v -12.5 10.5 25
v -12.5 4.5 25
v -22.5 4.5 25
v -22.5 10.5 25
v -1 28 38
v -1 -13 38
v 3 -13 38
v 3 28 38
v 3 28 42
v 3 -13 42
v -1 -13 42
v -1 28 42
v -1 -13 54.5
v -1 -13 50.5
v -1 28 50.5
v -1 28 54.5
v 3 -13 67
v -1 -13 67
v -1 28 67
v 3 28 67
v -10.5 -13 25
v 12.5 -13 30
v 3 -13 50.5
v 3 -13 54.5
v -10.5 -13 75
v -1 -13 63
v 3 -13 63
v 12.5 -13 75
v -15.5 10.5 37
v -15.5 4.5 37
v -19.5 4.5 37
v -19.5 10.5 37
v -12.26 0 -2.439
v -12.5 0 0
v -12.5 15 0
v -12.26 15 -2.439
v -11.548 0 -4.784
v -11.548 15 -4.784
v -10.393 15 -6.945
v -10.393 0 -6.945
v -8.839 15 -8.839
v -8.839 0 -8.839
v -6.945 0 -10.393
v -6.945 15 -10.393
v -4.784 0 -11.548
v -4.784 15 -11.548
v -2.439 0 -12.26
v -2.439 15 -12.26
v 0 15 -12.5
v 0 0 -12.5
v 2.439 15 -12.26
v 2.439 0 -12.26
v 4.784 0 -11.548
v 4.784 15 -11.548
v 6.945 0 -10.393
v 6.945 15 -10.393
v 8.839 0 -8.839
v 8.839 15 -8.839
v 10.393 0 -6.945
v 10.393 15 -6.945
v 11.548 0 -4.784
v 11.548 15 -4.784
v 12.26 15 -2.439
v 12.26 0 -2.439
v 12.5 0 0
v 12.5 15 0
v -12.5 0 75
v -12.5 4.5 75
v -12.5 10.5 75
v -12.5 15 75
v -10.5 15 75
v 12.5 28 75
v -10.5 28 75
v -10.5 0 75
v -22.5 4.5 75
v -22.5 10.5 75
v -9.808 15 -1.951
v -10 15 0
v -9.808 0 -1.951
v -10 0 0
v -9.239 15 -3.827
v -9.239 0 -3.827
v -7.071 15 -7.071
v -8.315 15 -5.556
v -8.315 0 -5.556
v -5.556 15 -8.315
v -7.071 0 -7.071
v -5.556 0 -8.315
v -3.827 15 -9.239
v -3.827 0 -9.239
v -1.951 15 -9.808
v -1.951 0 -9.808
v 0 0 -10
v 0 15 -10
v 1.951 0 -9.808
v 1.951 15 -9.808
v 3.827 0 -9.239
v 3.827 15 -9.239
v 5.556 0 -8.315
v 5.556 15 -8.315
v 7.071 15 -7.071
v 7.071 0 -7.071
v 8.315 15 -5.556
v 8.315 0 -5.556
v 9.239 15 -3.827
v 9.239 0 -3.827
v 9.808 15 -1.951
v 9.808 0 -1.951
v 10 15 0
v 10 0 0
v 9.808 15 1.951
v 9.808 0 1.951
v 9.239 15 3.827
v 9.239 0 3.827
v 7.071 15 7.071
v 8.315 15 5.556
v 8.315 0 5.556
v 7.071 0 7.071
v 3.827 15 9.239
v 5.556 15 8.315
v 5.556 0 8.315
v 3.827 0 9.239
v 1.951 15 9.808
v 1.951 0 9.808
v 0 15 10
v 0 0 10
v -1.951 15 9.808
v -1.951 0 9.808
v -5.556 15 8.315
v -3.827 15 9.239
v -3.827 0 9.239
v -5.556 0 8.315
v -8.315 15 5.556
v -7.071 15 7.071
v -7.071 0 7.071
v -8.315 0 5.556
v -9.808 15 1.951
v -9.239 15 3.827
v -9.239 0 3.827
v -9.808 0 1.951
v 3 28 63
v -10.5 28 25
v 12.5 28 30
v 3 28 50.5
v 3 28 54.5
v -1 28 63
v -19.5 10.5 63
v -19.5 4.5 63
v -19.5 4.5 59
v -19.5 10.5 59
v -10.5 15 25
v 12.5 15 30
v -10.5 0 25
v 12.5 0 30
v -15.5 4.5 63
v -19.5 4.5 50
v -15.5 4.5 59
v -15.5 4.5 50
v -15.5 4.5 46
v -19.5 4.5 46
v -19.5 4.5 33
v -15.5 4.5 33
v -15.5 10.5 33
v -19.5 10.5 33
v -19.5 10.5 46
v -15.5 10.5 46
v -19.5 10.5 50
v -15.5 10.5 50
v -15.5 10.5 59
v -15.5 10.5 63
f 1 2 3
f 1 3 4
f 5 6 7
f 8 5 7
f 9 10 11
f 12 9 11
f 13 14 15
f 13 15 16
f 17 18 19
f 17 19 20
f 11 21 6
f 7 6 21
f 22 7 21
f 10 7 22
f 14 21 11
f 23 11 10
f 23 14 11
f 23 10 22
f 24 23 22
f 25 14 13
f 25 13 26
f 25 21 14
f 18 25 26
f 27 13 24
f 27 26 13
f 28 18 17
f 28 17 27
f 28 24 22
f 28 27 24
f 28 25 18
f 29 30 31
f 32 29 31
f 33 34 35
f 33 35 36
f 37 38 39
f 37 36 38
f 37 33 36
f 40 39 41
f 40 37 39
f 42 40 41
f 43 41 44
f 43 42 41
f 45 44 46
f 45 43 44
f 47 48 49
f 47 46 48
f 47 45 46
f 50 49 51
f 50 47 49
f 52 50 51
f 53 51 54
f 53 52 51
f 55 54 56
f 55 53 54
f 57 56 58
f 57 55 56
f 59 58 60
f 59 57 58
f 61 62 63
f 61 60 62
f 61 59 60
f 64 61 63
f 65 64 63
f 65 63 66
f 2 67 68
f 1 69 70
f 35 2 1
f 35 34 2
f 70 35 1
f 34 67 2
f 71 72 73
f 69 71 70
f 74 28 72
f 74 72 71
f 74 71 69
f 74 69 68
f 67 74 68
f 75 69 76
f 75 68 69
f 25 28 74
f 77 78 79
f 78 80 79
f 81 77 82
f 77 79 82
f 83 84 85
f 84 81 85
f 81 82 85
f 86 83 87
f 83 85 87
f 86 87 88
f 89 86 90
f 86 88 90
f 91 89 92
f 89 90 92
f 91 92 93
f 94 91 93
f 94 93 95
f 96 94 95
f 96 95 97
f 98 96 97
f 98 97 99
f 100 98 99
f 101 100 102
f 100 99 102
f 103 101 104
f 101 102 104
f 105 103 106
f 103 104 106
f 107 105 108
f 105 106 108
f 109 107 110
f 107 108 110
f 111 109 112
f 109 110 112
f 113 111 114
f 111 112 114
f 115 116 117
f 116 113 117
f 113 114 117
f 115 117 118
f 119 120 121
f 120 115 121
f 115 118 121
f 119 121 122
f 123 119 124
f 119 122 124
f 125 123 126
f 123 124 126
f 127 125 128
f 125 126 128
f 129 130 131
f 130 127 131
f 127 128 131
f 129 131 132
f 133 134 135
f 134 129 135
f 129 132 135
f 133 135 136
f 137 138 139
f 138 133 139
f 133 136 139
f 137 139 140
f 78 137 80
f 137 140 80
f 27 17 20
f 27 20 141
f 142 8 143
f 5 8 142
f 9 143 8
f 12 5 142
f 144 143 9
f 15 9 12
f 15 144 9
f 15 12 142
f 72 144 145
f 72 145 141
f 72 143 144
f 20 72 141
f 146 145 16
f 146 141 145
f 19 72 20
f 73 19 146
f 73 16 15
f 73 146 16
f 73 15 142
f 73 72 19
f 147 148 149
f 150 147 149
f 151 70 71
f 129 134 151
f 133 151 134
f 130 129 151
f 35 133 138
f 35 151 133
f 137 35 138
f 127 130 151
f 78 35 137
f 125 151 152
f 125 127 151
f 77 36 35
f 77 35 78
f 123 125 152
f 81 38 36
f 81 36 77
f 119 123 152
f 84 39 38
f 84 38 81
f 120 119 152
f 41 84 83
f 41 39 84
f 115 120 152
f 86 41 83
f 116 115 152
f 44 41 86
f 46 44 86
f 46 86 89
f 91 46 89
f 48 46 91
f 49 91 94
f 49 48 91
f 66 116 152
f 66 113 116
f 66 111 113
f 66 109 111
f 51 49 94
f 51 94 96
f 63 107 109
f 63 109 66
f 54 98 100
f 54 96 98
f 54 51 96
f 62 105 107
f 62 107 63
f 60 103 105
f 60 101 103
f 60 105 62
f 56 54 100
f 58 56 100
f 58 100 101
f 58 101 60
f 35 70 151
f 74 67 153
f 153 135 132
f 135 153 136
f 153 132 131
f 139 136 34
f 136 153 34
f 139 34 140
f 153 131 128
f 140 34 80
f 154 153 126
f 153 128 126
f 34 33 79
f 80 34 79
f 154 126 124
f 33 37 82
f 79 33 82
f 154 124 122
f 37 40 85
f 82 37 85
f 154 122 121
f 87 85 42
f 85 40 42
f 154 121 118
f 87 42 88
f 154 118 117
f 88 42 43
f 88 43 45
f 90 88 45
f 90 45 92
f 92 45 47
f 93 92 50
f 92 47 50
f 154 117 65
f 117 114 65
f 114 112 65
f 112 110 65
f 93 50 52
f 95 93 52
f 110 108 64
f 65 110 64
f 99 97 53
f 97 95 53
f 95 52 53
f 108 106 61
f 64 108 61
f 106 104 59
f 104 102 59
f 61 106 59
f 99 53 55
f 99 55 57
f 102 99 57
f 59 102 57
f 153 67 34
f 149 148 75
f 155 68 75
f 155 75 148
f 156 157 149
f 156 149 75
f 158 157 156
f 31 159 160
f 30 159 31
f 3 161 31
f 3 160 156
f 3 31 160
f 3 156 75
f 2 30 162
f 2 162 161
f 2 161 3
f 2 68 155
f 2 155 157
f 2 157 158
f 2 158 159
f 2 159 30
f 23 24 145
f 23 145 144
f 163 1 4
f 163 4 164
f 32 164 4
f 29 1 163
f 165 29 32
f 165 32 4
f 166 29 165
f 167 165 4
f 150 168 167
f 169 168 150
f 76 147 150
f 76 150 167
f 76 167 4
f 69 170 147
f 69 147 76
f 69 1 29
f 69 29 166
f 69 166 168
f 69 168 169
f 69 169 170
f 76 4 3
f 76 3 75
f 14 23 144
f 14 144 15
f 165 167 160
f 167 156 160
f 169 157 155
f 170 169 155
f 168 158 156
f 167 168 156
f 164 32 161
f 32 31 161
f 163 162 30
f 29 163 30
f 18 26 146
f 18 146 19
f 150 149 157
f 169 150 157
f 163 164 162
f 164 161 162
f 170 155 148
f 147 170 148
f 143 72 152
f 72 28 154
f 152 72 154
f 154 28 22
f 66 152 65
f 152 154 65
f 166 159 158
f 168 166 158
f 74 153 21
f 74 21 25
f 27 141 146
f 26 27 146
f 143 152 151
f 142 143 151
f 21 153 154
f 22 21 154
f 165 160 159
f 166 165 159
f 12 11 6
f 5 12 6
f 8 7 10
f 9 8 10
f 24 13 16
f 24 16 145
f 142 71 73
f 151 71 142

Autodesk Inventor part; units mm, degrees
ref_plane "YZ Plane" through (0, 0, 0) normal (1, 0, 0) x (0, 1, 0)
ref_plane "XY Plane" through (0, 0, 0) normal (0, 0, 1) x (1, 0, 0)
sketch "Sketch1" plane through (0, 0, 0) normal (0, 1, 0) x (-1, 0, 0)
  circle A0 centre (0, 0) radius 10
  circle A1 centre (0, 0) radius 12.5
  line L0 (12.5, 0) -> (12.5, 50)
  line L1 (-12.5, 0) -> (-12.5, 50)
  line L2 (-12.5, 50) -> (12.5, 50)
  dimension "d0" = 20
  dimension "d1" = 25
  dimension "d2" = 50
extrude "Extrusion1" add sketch "Sketch1" along normal blind 15
sketch "Sketch2" plane through (-12.5, 0, 0) normal (-1, 0, 0) x (0, 0, 1)
  line L0 (-12.5, 0) -> (-12.5, 15) projected
  line L1 (-12.5, 7.5) -> (37.5, 7.5)
  line L2 (25, 7.5) -> (25, 4.5)
  line L3 (25, 4.5) -> (25, 10.5)
  line L4 (25, 10.5) -> (75, 10.5)
  line L5 (75, 10.5) -> (75, 4.5)
  line L6 (75, 4.5) -> (25, 4.5)
  point P0 (0, 0)
  dimension "d5" = 50
  dimension "d8" = 3
  dimension "d9" = 6
  dimension "d10" = 50
extrude "Extrusion2" add sketch "Sketch2" along normal blind 10
sketch "Sketch3" plane through (-12.5, 0, 50) normal (0, 0, 1) x (1, 0, 0)
  point P0 (12.5, 0)
sketch "Sketch4" plane through (-12.5, 0, 50) normal (0, 0, 1) x (1, 0, 0)
  line L0 (25, 0) -> (25, 15) projected
  line L1 (25, 0) -> (25, 15)
  line L2 (0, 15) -> (25, 15) projected
  line L3 (25, 15) -> (0, 15)
  line L4 (0, 0) -> (0, 15) projected
  line L5 (0, 15) -> (0, 0)
  line L6 (0, 0) -> (25, 0) projected
  line L7 (0, 0) -> (25, 0)
  point P0 (12.5, 0)
extrude "Extrusion3" add sketch "Sketch4" along normal blind 25
sketch "Sketch5" plane through (-12.5, 4.5, 25) normal (0, -1, 0) x (1, 0, 0)
  point P0 (12.5, -25)
sketch "Sketch8" plane through (-12.5, 4.5, 25) normal (0, -1, 0) x (1, 0, 0)
  line L0 (0, 0) -> (-10, 0) projected
  line L1 (-5, 0) -> (-5, 50)
  line L2 (0, 50) -> (-10, 50) projected
  line L3 (-3, 12) -> (-7, 12)
  line L4 (-7, 12) -> (-7, 8)
  line L5 (-7, 8) -> (-3, 8)
  line L6 (-3, 8) -> (-3, 12)
  line L7 (-3, 12) -> (-7, 8) construction
  line L8 (-7, 12) -> (-3, 8) construction
  line L9 (-5, 10) -> (-5, 23)
  line L10 (-7, 21) -> (-3, 21)
  line L11 (-3, 21) -> (-3, 25)
  line L12 (-3, 25) -> (-7, 25)
  line L13 (-7, 25) -> (-7, 21)
  line L14 (-7, 21) -> (-3, 25) construction
  line L15 (-3, 21) -> (-7, 25) construction
  line L16 (-5, 23) -> (-5, 36)
  line L17 (-7, 34) -> (-3, 34)
  line L18 (-3, 34) -> (-3, 38)
  line L19 (-3, 38) -> (-7, 38)
  line L20 (-7, 38) -> (-7, 34)
  line L21 (-7, 34) -> (-3, 38) construction
  line L22 (-3, 34) -> (-7, 38) construction
  point P0 (12.5, -25)
  dimension "d40" = 4
  dimension "d41" = 4
  dimension "d42" = 13
  dimension "d43" = 4
  dimension "d44" = 4
  dimension "d45" = 13
  dimension "d46" = 4
  dimension "d47" = 4
extrude "Extrusion6" cut sketch "Sketch8" against normal blind 10
sketch "Sketch9" plane through (0, 0, 0) normal (0, -1, 0) x (1, 0, 0)
  line L0 (-12.5, 25) -> (-22.5, 25) projected
  line L1 (-12.5, 25) -> (12.5, 25)
  line L2 (12.5, 0) -> (12.5, 75) projected
  line L3 (-12.5, 25) -> (-12.5, 75) projected
  line L4 (-12.5, 25) -> (-12.5, 75)
  line L5 (-12.5, 75) -> (12.5, 75) projected
  line L6 (-12.5, 75) -> (12.5, 75)
  line L7 (12.5, 75) -> (12.5, 25)
  line L8 (12.5, 0) -> (12.5, 30)
  line L9 (-12.5, 25) -> (-10.5, 25)
  line L10 (-10.5, 25) -> (-10.5, 75)
  line L11 (-12.5, 75) -> (-12.5, 25)
  line L12 (-10.5, 25) -> (12.5, 30)
  point P0 (0, 0)
  dimension "d50" = 30
  dimension "d51" = 2
extrude "Extrusion7" add sketch "Sketch9" along normal blind 13 contours L10 L5 L2 L12
sketch "Sketch10" plane through (0, -13, 0) normal (0, -1, 0) x (1, 0, 0)
  point P0 (0, 0)
sketch "Sketch11" plane through (0, -13, 0) normal (0, -1, 0) x (1, 0, 0)
  line L0 (-10.5, 25) -> (12.5, 30) projected
  line L1 (12.5, 30) -> (-10.5, 30)
  line L2 (-10.5, 25) -> (-10.5, 75) projected
  line L3 (-10.5, 30) -> (1, 30)
  line L4 (1, 30) -> (1, 75)
  line L5 (12.5, 75) -> (-12.5, 75) projected
  line L6 (-1, 42) -> (3, 42)
  line L7 (3, 42) -> (3, 38)
  line L8 (3, 38) -> (-1, 38)
  line L9 (-1, 38) -> (-1, 42)
  line L10 (-1, 42) -> (3, 38) construction
  line L11 (3, 42) -> (-1, 38) construction
  line L12 (1, 40) -> (1, 52.5)
  line L13 (-1, 50.5) -> (3, 50.5)
  line L14 (3, 50.5) -> (3, 54.5)
  line L15 (3, 54.5) -> (-1, 54.5)
  line L16 (-1, 54.5) -> (-1, 50.5)
  line L17 (-1, 50.5) -> (3, 54.5) construction
  line L18 (3, 50.5) -> (-1, 54.5) construction
  line L19 (1, 52.5) -> (1, 65)
  line L20 (-1, 63) -> (3, 63)
  line L21 (3, 63) -> (3, 67)
  line L22 (3, 67) -> (-1, 67)
  line L23 (-1, 67) -> (-1, 63)
  line L24 (-1, 63) -> (3, 67) construction
  line L25 (3, 63) -> (-1, 67) construction
  line L26 (-1, 38) -> (-1, 42)
  line L27 (-1, 38) -> (3, 38)
  line L28 (3, 38) -> (3, 42)
  line L29 (3, 42) -> (-1, 42)
  line L30 (-1, 42) -> (-1, 38)
  line L31 (-1, 38) -> (3, 42) construction
  line L32 (3, 38) -> (-1, 42) construction
  point P0 (0, 0)
  dimension "d54" = 11.5
  dimension "d55" = 4
  dimension "d56" = 4
  dimension "d57" = 12.5
  dimension "d58" = 4
  dimension "d59" = 4
  dimension "d60" = 12.5
  dimension "d61" = 4
  dimension "d62" = 4
extrude "Extrusion8" cut sketch "Sketch11" against normal blind 50 contours L8 L9 L6 L4 | L4 L6 L7 L8 | L22 L21 L20 L4 | L4 L20 L23 L22 | L13 L16 L15 L4 | L4 L15 L14 L13
ref_plane "Work Plane1" through (0, 7.5, 0) normal (0, 1, 0) x (-1, 0, 0)
mirror "Mirror1" about plane through (0, 7.5, 0) normal (0, 1, 0) of "Extrusion7"
mirror "Mirror2" about plane through (0, 7.5, 0) normal (0, 1, 0) of "Extrusion8"
properties part number "Part10copy"
